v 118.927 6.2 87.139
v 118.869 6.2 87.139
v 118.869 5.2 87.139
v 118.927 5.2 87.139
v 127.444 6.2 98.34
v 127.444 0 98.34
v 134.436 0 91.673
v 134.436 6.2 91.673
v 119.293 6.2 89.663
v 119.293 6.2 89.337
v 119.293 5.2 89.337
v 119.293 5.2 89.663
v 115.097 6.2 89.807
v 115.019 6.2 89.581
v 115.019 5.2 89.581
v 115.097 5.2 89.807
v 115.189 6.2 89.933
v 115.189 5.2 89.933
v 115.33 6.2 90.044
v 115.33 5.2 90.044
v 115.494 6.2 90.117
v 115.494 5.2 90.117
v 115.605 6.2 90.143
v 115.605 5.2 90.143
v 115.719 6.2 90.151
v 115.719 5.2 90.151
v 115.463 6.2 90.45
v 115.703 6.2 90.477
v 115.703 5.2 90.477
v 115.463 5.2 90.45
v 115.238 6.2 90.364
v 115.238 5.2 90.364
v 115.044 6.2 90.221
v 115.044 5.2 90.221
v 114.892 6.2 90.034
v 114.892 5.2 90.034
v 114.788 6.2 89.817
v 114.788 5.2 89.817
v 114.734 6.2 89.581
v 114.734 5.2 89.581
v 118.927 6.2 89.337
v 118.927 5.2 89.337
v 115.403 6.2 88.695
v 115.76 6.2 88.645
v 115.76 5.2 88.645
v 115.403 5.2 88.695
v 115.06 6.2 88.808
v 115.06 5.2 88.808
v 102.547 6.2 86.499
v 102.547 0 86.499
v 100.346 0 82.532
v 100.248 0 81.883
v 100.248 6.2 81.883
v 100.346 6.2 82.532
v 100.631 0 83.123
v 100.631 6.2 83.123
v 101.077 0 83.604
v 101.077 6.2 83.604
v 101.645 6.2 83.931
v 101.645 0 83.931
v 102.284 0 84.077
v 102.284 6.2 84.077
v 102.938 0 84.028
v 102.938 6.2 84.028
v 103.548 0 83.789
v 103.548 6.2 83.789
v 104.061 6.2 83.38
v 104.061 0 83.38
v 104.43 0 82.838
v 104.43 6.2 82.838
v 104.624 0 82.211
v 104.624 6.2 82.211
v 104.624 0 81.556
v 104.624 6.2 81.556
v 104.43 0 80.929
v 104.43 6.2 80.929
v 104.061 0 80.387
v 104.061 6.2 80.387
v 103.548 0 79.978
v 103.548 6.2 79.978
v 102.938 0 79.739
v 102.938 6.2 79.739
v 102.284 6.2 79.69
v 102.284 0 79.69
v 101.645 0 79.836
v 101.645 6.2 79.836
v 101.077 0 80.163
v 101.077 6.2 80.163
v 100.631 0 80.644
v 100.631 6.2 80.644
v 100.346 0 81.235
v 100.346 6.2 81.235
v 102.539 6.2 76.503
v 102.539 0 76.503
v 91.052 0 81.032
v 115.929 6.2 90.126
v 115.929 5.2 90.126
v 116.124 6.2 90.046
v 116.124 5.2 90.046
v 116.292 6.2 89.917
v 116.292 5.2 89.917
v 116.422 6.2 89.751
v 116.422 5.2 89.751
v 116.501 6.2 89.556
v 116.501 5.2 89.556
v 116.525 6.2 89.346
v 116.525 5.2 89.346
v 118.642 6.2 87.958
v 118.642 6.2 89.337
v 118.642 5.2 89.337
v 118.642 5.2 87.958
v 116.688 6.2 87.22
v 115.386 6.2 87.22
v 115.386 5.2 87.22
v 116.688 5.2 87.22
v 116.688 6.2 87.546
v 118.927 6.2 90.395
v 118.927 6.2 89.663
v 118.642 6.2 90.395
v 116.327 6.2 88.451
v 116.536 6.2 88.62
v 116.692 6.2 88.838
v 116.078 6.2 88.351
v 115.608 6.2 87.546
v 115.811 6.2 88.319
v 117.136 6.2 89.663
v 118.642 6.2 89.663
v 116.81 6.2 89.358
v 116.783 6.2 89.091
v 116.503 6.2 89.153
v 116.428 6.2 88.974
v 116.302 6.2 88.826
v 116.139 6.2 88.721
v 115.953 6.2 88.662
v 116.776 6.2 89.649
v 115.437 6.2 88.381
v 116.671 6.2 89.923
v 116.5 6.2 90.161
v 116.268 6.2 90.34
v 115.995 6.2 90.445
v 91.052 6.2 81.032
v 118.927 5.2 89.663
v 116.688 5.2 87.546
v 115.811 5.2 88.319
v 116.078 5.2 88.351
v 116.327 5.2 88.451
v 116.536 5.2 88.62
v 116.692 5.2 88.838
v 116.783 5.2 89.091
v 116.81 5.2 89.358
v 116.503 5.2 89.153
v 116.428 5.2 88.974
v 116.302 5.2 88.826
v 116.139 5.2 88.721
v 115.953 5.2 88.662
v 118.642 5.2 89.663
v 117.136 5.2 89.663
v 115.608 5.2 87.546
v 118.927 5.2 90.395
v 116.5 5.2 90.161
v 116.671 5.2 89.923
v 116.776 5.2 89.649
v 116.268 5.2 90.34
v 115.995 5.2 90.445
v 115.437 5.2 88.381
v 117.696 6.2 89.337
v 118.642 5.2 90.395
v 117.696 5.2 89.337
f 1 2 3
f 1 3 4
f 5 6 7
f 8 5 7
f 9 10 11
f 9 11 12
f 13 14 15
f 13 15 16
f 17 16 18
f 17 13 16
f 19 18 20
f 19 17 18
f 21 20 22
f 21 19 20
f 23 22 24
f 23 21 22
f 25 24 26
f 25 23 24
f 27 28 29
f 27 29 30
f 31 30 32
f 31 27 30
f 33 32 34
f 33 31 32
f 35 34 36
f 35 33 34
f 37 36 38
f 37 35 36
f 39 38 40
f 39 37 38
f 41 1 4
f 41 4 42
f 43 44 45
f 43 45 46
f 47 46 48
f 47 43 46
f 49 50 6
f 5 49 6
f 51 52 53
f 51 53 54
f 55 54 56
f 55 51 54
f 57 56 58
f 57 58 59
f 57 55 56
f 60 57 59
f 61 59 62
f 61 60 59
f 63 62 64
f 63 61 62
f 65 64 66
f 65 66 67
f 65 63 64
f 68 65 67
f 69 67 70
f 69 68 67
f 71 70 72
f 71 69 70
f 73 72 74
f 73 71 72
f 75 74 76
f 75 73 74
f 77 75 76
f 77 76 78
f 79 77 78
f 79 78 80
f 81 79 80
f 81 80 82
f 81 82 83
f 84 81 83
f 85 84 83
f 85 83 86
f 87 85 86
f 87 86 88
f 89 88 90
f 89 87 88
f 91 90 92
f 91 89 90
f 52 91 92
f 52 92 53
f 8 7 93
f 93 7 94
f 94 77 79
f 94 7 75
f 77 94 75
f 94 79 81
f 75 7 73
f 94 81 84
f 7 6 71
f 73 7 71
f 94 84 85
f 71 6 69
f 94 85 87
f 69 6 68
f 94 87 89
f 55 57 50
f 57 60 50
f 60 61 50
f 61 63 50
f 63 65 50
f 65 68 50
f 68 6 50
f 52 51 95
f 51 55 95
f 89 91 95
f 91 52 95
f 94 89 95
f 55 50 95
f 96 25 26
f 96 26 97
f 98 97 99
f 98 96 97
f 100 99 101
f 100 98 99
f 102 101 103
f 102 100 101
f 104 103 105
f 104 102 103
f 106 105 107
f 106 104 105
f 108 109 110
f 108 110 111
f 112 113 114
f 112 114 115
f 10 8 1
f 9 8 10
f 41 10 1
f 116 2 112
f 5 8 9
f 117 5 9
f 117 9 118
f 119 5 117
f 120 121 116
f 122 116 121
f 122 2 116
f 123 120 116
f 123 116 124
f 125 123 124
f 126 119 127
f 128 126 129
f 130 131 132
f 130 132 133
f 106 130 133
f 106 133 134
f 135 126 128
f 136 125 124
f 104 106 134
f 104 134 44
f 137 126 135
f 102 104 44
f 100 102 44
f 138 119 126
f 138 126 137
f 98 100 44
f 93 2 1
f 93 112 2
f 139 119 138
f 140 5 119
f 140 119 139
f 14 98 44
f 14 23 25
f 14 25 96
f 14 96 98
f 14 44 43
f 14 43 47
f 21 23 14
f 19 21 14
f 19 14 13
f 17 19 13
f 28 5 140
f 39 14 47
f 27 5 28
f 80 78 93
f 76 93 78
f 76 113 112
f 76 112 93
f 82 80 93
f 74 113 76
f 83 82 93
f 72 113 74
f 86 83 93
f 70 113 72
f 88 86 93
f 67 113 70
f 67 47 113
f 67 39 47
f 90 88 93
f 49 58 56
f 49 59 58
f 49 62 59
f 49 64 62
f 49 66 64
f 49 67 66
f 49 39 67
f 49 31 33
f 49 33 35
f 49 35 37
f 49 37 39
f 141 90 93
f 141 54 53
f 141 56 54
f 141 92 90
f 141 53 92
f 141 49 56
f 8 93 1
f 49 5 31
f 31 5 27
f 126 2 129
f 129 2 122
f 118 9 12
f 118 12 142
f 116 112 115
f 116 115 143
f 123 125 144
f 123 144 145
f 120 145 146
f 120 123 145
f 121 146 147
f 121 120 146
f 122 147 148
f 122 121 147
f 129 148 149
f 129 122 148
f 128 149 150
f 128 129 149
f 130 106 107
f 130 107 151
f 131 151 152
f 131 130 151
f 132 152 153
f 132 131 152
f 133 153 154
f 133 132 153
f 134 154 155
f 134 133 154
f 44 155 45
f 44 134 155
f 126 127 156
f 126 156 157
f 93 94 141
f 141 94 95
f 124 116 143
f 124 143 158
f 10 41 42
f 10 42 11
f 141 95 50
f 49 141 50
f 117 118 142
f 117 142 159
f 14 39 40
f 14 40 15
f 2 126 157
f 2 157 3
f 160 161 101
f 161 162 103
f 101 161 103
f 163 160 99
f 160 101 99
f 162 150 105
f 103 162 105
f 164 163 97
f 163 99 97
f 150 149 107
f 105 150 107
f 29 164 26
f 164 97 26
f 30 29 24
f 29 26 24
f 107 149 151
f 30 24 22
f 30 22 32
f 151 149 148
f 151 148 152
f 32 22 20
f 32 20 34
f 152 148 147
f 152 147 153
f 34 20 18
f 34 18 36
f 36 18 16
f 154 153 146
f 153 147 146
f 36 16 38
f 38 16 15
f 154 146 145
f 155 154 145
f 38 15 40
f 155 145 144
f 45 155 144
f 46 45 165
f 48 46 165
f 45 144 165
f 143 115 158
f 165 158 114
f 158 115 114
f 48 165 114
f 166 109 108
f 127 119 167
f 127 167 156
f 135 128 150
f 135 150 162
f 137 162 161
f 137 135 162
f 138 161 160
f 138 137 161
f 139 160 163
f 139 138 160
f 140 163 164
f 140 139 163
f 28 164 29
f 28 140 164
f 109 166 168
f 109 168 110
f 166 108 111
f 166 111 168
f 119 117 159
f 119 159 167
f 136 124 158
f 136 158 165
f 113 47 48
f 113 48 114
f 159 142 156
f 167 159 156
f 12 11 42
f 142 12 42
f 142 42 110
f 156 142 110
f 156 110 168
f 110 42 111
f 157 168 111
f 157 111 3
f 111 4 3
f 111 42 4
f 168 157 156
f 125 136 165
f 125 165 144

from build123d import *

# Parameters (mm, degrees)
SKETCH1_R           = 2.2
BOSS_EXTRUDE1_DEPTH = 6.2
CUT_EXTRUDE1_DEPTH  = 1


with BuildPart() as part:
    # Sketch1 → Boss-Extrude1 (new body)
    with BuildSketch(Plane(origin=(0, 0, 0), x_dir=(-1, 0, 0), z_dir=(0, 1, 0))):
        Polygon((-127.443880814, 98.339887686), (-134.435779681, 91.672540756), (-102.538529649, 76.502840404), (-91.051660388, 81.032468444), (-102.547087364, 86.499465833), align=None)
        with Locations((-102.448365494, 81.883499702)):
            Circle(SKETCH1_R, mode=Mode.SUBTRACT)
    extrude(amount=BOSS_EXTRUDE1_DEPTH)

    # Sketch2 → Cut-Extrude1 (cut)
    with BuildSketch(Plane(origin=(0, 6.2, 0), x_dir=(1, 0, 0), z_dir=(0, 1, 0))):
        with BuildLine():
            Line((116.688123147, -87.22045081), (116.688123147, -87.546091836))
            Line((116.688123147, -87.546091836), (115.608165214, -87.546091836))
            Line((115.608165214, -87.546091836), (115.437076472, -88.381182982))
            add(Edge.make_bspline(
                [(115.437076472, -88.381182982), (115.470691444, -88.371902664), (115.535815135, -88.353923515), (115.631935866, -88.333961138), (115.723187365, -88.321927485), (115.782401451, -88.320284368), (115.811054838, -88.319489272)],
                knots=[0, 0, 0, 0, 0.000104595, 0.000202637, 0.000294305, 0.000380252, 0.000380252, 0.000380252, 0.000380252], degree=3))
            add(Edge.make_bspline(
                [(115.811054838, -88.319489272), (115.846509373, -88.320256656), (115.916221848, -88.321765526), (116.018220035, -88.336254275), (116.115586303, -88.359059769), (116.208117024, -88.3909191), (116.295983381, -88.431658643), (116.378376955, -88.482549303), (116.45653449, -88.541997397), (116.529053843, -88.610346086), (116.594843751, -88.685567839), (116.652688613, -88.766446764), (116.70182182, -88.852196858), (116.741337648, -88.94363741), (116.772892008, -89.039757499), (116.793894175, -89.141568485), (116.807879332, -89.248110708), (116.809441783, -89.320958425), (116.810238532, -89.358106059)],
                knots=[0, 0, 0, 0, 0.000106308, 0.000209029, 0.000308378, 0.000405929, 0.000502102, 0.000598312, 0.00069588, 0.000796219, 0.000896736, 0.000995218, 0.001094066, 0.001192613, 0.001293582, 0.001396995, 0.001504047, 0.001615439, 0.001615439, 0.001615439, 0.001615439], degree=3))
            add(Edge.make_bspline(
                [(116.810238532, -89.358106059), (116.809635213, -89.383979787), (116.80843673, -89.435377583), (116.802342011, -89.511708394), (116.790607469, -89.586423249), (116.774852462, -89.659532062), (116.754403269, -89.730896421), (116.729648198, -89.800720593), (116.69935323, -89.868569986), (116.66612334, -89.935086594), (116.628706892, -89.998766669), (116.587179246, -90.058319678), (116.543304836, -90.11463899), (116.496095865, -90.167120591), (116.445113534, -90.215419615), (116.390975278, -90.259822698), (116.334113097, -90.301080762), (116.27364727, -90.337519054), (116.210925161, -90.371049735), (116.145040992, -90.398557516), (116.0774945, -90.423150638), (116.007313506, -90.442753566), (115.934656976, -90.458113812), (115.859405144, -90.4685465), (115.781952679, -90.476145125), (115.729451774, -90.476620792), (115.702931841, -90.476861067)],
                knots=[0, 0, 0, 0, 7.7636e-05, 0.000154223, 0.000229512, 0.000304362, 0.000378447, 0.000452077, 0.000526407, 0.000601214, 0.00067506, 0.000747747, 0.00081887, 0.000889121, 0.000959302, 0.001029336, 0.001099058, 0.00116985, 0.001240974, 0.00131221, 0.00138383, 0.001456517, 0.001530612, 0.001606437, 0.001684346, 0.001763871, 0.001763871, 0.001763871, 0.001763871], degree=3))
            add(Edge.make_bspline(
                [(115.702931841, -90.476861067), (115.671295977, -90.476234378), (115.609056152, -90.475001442), (115.517869638, -90.462103245), (115.430135674, -90.443630263), (115.346560511, -90.41583879), (115.26639515, -90.38101603), (115.190718827, -90.337004931), (115.117597873, -90.28713103), (115.050004812, -90.228275281), (114.987270337, -90.163944627), (114.93111229, -90.094133052), (114.88109826, -90.019992773), (114.83802916, -89.941163733), (114.80129167, -89.857853066), (114.77243093, -89.769748629), (114.749136994, -89.677310768), (114.73928232, -89.613671513), (114.734276993, -89.581348246)],
                knots=[0, 0, 0, 0, 9.4843e-05, 0.000186593, 0.000275792, 0.000363484, 0.000450342, 0.000537514, 0.000625728, 0.000715478, 0.000805885, 0.000894984, 0.00098389, 0.001073836, 0.001164117, 0.001256635, 0.001351658, 0.001449737, 0.001449737, 0.001449737, 0.001449737], degree=3))
            Line((114.734276993, -89.581348246), (115.019212891, -89.581348246))
            add(Edge.make_bspline(
                [(115.019212891, -89.581348246), (115.026223796, -89.611625457), (115.039699146, -89.669819936), (115.069277218, -89.751581939), (115.105441262, -89.824442949), (115.148443778, -89.889366785), (115.199742735, -89.945980661), (115.258280145, -89.996433282), (115.323909866, -90.041949292), (115.396838009, -90.079888516), (115.473775589, -90.112245171), (115.554300129, -90.133791352), (115.636219072, -90.148941447), (115.691625879, -90.150457973), (115.719468299, -90.151220041)],
                knots=[0, 0, 0, 0, 9.3172e-05, 0.000179081, 0.000260145, 0.000336703, 0.000411917, 0.000488562, 0.000568128, 0.000650923, 0.00073478, 0.000817953, 0.000900557, 0.000983994, 0.000983994, 0.000983994, 0.000983994], degree=3))
            add(Edge.make_bspline(
                [(115.719468299, -90.151220041), (115.746644888, -90.150475478), (115.800155814, -90.149009428), (115.878906143, -90.137725467), (115.954936393, -90.120346813), (116.027496353, -90.094339159), (116.097855749, -90.062730021), (116.164234813, -90.02216706), (116.228553851, -89.975485472), (116.288813658, -89.922003386), (116.34400373, -89.863066591), (116.392768211, -89.80004067), (116.433387268, -89.732806102), (116.467617496, -89.662526885), (116.493610131, -89.588432765), (116.512153021, -89.510870985), (116.52304151, -89.429649967), (116.524539366, -89.374251379), (116.525302634, -89.346021724)],
                knots=[0, 0, 0, 0, 8.15e-05, 0.000160473, 0.000238226, 0.000315066, 0.000391338, 0.000469218, 0.000547964, 0.000629516, 0.000710512, 0.000789892, 0.000868102, 0.000945761, 0.001024012, 0.00110315, 0.001184644, 0.001269321, 0.001269321, 0.001269321, 0.001269321], degree=3))
            add(Edge.make_bspline(
                [(116.525302634, -89.346021724), (116.524705299, -89.320553006), (116.523536101, -89.270701615), (116.513983369, -89.19776805), (116.497367259, -89.128758933), (116.474304168, -89.06334102), (116.445022043, -89.001452612), (116.409238602, -88.943029836), (116.366282306, -88.888842716), (116.317213235, -88.838865899), (116.263457727, -88.792742334), (116.204090903, -88.753423056), (116.140355112, -88.720345073), (116.073018261, -88.691799103), (116.000478675, -88.671296999), (115.924172873, -88.655904703), (115.843276859, -88.647000766), (115.787967735, -88.645765339), (115.75953741, -88.645130297)],
                knots=[0, 0, 0, 0, 7.6388e-05, 0.000149519, 0.000220172, 0.000288967, 0.000357247, 0.000425206, 0.000494043, 0.000564207, 0.000635056, 0.000706145, 0.000777268, 0.000850264, 0.000925136, 0.001002969, 0.001083601, 0.001168886, 0.001168886, 0.001168886, 0.001168886], degree=3))
            add(Edge.make_bspline(
                [(115.75953741, -88.645130297), (115.734927596, -88.645656977), (115.684114573, -88.646744435), (115.606170295, -88.654751329), (115.524262803, -88.667668403), (115.438706082, -88.685435928), (115.349243193, -88.708686976), (115.256062929, -88.736549416), (115.158969373, -88.769861515), (115.093548295, -88.795018594), (115.059918019, -88.80795081)],
                knots=[0, 0, 0, 0, 7.3822e-05, 0.000152423, 0.000234822, 0.000322511, 0.00041445, 0.000512043, 0.000614219, 0.000722306, 0.000722306, 0.000722306, 0.000722306], degree=3))
            Line((115.059918019, -88.80795081), (115.385559044, -87.22045081))
            Line((115.385559044, -87.22045081), (116.688123147, -87.22045081))
        make_face()
        Polygon((118.869027594, -87.139040554), (118.926905198, -87.139040554), (118.926905198, -89.337117477), (119.293251352, -89.337117477), (119.293251352, -89.662758503), (118.926905198, -89.662758503), (118.926905198, -90.39545081), (118.641969301, -90.39545081), (118.641969301, -89.662758503), (117.135879557, -89.662758503), align=None)
        Polygon((118.641969301, -89.337117477), (118.641969301, -87.958231259), (117.69557507, -89.337117477), align=None, mode=Mode.SUBTRACT)
    extrude(amount=-CUT_EXTRUDE1_DEPTH, mode=Mode.SUBTRACT)


solid = part.part
